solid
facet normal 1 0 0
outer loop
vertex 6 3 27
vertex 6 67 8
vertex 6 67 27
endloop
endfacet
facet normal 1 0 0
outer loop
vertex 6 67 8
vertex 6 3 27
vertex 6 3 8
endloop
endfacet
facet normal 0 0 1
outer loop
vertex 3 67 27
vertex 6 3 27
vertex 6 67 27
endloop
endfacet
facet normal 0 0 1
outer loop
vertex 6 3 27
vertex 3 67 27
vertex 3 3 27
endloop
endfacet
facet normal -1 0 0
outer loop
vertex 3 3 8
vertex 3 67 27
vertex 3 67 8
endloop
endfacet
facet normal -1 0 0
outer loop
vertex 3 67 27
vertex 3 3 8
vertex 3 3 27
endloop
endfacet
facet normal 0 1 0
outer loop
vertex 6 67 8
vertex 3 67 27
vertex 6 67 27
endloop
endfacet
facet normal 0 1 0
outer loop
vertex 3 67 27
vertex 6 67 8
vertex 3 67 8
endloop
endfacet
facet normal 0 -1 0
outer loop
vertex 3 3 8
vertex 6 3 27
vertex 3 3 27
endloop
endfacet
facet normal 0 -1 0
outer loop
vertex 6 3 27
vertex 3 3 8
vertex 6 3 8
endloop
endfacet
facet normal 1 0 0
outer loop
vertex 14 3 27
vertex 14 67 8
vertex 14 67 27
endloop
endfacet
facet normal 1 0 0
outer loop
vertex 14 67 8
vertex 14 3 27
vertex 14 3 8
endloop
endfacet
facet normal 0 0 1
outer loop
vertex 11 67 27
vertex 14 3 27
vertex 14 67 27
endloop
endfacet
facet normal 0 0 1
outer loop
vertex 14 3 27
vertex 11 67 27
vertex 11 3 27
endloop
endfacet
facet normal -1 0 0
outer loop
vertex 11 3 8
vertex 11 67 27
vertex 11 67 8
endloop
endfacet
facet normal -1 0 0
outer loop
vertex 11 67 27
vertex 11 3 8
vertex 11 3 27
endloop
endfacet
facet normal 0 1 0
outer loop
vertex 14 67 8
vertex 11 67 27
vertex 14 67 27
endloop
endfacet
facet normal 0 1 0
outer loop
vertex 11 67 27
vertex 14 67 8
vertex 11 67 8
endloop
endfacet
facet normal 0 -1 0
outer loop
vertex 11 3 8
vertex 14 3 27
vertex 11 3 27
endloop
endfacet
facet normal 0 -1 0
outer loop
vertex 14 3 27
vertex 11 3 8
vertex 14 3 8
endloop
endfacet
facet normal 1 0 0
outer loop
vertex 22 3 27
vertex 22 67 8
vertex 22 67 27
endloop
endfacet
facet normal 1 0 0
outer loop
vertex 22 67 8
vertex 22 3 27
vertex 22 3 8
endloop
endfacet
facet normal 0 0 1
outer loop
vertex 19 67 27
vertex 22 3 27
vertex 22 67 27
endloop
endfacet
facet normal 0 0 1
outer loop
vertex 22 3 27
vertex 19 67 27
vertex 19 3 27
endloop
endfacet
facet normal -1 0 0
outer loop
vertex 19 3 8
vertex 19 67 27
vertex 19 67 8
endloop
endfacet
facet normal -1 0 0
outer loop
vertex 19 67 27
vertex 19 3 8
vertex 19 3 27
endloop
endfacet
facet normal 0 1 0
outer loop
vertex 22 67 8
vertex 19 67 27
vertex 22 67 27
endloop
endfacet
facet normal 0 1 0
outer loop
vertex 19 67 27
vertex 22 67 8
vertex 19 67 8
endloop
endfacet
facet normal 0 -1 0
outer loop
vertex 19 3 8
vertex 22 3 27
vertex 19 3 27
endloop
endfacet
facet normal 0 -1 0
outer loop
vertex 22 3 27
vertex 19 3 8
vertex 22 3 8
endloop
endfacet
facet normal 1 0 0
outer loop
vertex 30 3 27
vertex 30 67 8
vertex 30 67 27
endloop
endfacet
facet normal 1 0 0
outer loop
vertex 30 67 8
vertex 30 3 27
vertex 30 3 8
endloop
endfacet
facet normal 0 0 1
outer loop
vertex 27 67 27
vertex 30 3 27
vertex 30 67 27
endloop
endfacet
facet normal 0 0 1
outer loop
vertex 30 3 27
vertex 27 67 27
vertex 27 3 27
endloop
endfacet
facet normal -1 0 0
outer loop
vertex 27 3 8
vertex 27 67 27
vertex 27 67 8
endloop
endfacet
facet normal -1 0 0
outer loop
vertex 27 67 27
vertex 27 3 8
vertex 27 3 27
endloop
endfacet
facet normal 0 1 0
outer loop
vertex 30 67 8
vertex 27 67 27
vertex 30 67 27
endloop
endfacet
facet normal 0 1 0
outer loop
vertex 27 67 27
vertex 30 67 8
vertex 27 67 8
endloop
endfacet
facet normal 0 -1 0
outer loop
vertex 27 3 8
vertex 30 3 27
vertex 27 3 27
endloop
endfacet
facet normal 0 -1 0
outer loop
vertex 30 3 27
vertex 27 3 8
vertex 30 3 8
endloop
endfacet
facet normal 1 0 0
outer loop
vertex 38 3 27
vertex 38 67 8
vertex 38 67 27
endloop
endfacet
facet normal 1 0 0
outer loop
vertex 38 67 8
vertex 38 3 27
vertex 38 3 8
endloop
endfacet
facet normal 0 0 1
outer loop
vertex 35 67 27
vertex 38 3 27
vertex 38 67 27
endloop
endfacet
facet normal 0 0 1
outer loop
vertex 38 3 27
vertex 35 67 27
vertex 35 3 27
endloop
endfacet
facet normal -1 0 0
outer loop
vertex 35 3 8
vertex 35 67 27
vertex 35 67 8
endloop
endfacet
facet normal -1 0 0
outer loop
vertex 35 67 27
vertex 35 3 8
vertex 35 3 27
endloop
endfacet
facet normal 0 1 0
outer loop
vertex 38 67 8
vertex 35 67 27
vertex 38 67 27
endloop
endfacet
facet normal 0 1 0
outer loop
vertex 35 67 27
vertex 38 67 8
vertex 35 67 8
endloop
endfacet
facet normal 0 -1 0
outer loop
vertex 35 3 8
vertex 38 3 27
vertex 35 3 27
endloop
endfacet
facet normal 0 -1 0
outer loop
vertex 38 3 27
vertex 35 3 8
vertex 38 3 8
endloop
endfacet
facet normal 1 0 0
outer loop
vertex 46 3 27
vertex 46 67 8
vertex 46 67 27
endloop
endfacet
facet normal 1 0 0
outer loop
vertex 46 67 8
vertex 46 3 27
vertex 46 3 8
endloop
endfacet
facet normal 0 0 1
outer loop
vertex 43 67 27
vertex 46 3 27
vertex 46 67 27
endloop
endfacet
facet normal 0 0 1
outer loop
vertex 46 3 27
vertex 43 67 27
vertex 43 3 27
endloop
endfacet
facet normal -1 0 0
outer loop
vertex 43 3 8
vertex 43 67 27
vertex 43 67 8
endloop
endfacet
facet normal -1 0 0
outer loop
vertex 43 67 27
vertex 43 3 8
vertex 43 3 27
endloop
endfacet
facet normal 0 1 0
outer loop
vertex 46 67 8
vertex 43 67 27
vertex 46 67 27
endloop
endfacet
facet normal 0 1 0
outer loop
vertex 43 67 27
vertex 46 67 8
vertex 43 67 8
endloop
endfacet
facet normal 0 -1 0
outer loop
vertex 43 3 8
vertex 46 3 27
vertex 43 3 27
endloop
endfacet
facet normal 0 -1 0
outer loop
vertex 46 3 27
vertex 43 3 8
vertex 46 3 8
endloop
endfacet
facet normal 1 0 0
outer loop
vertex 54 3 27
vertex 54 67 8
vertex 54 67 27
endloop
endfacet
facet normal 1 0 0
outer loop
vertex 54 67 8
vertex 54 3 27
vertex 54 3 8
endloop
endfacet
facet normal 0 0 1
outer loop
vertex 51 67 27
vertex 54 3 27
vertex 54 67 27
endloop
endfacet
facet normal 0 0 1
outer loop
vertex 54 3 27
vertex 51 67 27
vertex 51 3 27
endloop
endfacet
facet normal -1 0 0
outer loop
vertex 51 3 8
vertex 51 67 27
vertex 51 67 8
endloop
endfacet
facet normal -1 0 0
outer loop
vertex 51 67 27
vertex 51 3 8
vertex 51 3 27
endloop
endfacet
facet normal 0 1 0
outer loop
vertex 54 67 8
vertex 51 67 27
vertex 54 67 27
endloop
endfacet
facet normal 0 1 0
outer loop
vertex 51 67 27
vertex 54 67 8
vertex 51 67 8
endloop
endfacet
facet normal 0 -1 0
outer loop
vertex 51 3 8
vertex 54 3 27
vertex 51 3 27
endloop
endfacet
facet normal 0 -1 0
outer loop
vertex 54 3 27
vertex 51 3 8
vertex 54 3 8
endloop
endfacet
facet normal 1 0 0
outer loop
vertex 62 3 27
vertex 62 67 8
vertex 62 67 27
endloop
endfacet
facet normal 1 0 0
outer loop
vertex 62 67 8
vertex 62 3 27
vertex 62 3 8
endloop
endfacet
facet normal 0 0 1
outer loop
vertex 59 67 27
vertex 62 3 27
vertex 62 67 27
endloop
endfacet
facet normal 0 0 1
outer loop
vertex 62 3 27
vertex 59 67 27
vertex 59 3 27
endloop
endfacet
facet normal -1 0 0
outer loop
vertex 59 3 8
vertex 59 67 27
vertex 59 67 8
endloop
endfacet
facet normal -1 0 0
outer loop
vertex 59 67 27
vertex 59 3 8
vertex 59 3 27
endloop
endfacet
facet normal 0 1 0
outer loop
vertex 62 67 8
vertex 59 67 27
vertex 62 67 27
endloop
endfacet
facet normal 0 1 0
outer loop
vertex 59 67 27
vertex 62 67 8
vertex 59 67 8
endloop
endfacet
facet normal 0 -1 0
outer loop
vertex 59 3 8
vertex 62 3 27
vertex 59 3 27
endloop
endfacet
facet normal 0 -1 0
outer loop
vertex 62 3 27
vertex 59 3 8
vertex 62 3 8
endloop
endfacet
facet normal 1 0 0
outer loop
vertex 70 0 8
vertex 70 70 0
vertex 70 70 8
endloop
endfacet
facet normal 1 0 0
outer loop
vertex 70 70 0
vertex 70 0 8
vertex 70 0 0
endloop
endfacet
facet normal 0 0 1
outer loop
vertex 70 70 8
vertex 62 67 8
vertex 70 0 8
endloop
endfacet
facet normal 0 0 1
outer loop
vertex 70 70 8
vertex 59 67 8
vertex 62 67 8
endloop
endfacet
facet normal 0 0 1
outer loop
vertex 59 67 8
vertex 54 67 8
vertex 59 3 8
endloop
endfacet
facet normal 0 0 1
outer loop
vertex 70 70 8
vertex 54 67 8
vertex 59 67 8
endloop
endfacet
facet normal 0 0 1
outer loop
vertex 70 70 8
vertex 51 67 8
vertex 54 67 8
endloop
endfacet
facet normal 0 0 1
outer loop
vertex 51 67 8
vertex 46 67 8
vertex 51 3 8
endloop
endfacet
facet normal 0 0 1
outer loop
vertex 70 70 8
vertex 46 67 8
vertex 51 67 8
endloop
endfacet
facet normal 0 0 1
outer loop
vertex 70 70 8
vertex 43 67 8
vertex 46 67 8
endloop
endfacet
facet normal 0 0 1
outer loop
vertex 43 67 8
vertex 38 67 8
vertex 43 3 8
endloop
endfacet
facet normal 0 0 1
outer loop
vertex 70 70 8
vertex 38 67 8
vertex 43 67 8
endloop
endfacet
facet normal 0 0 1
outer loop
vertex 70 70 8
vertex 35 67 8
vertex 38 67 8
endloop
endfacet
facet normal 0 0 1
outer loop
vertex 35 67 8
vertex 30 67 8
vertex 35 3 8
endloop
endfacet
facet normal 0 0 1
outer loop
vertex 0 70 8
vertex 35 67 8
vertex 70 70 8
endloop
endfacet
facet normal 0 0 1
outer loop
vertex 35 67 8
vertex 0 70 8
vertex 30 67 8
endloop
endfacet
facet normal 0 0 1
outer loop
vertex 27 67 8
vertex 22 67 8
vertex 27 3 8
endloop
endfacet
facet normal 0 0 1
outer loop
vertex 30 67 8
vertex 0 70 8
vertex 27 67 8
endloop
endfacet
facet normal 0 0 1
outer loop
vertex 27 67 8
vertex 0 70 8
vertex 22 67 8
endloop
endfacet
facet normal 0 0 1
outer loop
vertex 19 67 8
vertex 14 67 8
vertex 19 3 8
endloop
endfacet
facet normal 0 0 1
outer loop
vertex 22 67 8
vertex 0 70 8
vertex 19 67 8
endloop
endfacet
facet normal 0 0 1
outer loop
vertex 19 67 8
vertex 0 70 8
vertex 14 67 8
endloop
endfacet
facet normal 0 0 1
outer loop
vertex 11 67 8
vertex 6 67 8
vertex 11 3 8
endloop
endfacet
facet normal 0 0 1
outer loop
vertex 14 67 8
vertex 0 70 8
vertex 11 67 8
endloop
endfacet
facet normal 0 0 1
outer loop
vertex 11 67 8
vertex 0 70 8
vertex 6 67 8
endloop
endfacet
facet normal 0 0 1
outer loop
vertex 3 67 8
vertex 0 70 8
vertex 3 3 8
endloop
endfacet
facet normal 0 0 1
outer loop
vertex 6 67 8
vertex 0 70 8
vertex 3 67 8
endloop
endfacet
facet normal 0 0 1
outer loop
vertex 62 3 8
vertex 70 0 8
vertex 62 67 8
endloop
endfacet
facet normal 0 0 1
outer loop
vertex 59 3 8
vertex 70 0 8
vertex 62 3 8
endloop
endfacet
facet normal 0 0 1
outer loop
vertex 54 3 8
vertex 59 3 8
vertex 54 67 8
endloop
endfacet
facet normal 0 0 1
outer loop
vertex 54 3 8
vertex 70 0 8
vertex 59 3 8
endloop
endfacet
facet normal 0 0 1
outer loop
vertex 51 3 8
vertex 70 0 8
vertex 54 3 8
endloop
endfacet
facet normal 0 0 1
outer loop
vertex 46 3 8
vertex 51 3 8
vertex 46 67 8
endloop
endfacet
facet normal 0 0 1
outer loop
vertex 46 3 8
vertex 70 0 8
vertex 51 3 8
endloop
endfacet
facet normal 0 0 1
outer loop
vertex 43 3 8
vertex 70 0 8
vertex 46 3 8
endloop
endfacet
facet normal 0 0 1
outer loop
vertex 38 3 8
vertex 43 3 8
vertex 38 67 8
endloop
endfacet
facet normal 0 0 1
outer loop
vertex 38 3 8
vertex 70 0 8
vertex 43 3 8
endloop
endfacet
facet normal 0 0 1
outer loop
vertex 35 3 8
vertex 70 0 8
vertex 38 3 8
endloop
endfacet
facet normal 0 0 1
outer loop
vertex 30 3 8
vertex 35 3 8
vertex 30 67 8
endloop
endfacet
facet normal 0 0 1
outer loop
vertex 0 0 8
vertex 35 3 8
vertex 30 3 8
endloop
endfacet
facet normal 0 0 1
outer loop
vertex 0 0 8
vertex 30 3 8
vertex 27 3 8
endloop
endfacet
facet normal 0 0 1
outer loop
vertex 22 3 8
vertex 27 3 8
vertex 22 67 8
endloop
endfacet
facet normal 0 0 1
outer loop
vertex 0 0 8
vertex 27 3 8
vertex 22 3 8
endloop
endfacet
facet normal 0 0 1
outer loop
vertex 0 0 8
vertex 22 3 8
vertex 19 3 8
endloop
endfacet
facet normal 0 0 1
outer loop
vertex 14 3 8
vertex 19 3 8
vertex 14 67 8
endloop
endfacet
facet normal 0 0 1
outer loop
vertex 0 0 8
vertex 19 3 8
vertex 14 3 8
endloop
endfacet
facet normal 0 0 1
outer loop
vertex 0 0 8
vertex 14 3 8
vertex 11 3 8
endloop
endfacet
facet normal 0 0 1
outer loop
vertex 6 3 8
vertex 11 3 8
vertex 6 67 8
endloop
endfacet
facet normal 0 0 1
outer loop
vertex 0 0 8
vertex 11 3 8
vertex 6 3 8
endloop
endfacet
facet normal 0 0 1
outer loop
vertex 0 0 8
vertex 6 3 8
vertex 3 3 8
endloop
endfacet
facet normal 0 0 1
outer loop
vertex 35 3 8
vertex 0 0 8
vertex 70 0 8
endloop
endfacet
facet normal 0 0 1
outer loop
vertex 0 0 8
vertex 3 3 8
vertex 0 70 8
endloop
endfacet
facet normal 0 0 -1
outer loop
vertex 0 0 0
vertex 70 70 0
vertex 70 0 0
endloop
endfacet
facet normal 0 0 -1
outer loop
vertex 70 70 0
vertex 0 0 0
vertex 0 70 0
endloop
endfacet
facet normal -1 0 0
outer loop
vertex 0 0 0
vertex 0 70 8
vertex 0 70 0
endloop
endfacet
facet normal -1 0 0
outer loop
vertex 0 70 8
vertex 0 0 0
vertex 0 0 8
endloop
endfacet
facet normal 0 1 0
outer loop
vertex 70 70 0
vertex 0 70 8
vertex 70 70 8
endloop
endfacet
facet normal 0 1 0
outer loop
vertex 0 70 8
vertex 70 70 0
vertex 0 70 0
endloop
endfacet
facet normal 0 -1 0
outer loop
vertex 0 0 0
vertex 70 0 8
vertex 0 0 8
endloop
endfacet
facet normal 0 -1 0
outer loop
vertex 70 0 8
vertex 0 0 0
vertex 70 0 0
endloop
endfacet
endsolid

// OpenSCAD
$fn = 32;

// ----------------------------------------------------------------------
// Heatsink: uniform fin block
// ----------------------------------------------------------------------

// --- parameters (mm) ---
base_l = 70;              // base length, X
base_w = 70;              // base width, Y
base_t = 8;               // base plate thickness
fin_h = 20;               // fin height above the base
fin_t = 3;                // fin thickness
edge = 3;                 // margin from the base ends
pitch = 8;                // fin pitch

n_fins = floor((base_l - 2 * edge - fin_t) / pitch) + 1;  // fin count
total_h = base_t + fin_h - 1;  // overall height

union() {
  cube([base_l, base_w, base_t]);
  for (i = [0 : n_fins - 1])
    translate([edge + i * pitch, edge, base_t - 1])
      cube([fin_t, base_w - 2 * edge, fin_h]);
}
